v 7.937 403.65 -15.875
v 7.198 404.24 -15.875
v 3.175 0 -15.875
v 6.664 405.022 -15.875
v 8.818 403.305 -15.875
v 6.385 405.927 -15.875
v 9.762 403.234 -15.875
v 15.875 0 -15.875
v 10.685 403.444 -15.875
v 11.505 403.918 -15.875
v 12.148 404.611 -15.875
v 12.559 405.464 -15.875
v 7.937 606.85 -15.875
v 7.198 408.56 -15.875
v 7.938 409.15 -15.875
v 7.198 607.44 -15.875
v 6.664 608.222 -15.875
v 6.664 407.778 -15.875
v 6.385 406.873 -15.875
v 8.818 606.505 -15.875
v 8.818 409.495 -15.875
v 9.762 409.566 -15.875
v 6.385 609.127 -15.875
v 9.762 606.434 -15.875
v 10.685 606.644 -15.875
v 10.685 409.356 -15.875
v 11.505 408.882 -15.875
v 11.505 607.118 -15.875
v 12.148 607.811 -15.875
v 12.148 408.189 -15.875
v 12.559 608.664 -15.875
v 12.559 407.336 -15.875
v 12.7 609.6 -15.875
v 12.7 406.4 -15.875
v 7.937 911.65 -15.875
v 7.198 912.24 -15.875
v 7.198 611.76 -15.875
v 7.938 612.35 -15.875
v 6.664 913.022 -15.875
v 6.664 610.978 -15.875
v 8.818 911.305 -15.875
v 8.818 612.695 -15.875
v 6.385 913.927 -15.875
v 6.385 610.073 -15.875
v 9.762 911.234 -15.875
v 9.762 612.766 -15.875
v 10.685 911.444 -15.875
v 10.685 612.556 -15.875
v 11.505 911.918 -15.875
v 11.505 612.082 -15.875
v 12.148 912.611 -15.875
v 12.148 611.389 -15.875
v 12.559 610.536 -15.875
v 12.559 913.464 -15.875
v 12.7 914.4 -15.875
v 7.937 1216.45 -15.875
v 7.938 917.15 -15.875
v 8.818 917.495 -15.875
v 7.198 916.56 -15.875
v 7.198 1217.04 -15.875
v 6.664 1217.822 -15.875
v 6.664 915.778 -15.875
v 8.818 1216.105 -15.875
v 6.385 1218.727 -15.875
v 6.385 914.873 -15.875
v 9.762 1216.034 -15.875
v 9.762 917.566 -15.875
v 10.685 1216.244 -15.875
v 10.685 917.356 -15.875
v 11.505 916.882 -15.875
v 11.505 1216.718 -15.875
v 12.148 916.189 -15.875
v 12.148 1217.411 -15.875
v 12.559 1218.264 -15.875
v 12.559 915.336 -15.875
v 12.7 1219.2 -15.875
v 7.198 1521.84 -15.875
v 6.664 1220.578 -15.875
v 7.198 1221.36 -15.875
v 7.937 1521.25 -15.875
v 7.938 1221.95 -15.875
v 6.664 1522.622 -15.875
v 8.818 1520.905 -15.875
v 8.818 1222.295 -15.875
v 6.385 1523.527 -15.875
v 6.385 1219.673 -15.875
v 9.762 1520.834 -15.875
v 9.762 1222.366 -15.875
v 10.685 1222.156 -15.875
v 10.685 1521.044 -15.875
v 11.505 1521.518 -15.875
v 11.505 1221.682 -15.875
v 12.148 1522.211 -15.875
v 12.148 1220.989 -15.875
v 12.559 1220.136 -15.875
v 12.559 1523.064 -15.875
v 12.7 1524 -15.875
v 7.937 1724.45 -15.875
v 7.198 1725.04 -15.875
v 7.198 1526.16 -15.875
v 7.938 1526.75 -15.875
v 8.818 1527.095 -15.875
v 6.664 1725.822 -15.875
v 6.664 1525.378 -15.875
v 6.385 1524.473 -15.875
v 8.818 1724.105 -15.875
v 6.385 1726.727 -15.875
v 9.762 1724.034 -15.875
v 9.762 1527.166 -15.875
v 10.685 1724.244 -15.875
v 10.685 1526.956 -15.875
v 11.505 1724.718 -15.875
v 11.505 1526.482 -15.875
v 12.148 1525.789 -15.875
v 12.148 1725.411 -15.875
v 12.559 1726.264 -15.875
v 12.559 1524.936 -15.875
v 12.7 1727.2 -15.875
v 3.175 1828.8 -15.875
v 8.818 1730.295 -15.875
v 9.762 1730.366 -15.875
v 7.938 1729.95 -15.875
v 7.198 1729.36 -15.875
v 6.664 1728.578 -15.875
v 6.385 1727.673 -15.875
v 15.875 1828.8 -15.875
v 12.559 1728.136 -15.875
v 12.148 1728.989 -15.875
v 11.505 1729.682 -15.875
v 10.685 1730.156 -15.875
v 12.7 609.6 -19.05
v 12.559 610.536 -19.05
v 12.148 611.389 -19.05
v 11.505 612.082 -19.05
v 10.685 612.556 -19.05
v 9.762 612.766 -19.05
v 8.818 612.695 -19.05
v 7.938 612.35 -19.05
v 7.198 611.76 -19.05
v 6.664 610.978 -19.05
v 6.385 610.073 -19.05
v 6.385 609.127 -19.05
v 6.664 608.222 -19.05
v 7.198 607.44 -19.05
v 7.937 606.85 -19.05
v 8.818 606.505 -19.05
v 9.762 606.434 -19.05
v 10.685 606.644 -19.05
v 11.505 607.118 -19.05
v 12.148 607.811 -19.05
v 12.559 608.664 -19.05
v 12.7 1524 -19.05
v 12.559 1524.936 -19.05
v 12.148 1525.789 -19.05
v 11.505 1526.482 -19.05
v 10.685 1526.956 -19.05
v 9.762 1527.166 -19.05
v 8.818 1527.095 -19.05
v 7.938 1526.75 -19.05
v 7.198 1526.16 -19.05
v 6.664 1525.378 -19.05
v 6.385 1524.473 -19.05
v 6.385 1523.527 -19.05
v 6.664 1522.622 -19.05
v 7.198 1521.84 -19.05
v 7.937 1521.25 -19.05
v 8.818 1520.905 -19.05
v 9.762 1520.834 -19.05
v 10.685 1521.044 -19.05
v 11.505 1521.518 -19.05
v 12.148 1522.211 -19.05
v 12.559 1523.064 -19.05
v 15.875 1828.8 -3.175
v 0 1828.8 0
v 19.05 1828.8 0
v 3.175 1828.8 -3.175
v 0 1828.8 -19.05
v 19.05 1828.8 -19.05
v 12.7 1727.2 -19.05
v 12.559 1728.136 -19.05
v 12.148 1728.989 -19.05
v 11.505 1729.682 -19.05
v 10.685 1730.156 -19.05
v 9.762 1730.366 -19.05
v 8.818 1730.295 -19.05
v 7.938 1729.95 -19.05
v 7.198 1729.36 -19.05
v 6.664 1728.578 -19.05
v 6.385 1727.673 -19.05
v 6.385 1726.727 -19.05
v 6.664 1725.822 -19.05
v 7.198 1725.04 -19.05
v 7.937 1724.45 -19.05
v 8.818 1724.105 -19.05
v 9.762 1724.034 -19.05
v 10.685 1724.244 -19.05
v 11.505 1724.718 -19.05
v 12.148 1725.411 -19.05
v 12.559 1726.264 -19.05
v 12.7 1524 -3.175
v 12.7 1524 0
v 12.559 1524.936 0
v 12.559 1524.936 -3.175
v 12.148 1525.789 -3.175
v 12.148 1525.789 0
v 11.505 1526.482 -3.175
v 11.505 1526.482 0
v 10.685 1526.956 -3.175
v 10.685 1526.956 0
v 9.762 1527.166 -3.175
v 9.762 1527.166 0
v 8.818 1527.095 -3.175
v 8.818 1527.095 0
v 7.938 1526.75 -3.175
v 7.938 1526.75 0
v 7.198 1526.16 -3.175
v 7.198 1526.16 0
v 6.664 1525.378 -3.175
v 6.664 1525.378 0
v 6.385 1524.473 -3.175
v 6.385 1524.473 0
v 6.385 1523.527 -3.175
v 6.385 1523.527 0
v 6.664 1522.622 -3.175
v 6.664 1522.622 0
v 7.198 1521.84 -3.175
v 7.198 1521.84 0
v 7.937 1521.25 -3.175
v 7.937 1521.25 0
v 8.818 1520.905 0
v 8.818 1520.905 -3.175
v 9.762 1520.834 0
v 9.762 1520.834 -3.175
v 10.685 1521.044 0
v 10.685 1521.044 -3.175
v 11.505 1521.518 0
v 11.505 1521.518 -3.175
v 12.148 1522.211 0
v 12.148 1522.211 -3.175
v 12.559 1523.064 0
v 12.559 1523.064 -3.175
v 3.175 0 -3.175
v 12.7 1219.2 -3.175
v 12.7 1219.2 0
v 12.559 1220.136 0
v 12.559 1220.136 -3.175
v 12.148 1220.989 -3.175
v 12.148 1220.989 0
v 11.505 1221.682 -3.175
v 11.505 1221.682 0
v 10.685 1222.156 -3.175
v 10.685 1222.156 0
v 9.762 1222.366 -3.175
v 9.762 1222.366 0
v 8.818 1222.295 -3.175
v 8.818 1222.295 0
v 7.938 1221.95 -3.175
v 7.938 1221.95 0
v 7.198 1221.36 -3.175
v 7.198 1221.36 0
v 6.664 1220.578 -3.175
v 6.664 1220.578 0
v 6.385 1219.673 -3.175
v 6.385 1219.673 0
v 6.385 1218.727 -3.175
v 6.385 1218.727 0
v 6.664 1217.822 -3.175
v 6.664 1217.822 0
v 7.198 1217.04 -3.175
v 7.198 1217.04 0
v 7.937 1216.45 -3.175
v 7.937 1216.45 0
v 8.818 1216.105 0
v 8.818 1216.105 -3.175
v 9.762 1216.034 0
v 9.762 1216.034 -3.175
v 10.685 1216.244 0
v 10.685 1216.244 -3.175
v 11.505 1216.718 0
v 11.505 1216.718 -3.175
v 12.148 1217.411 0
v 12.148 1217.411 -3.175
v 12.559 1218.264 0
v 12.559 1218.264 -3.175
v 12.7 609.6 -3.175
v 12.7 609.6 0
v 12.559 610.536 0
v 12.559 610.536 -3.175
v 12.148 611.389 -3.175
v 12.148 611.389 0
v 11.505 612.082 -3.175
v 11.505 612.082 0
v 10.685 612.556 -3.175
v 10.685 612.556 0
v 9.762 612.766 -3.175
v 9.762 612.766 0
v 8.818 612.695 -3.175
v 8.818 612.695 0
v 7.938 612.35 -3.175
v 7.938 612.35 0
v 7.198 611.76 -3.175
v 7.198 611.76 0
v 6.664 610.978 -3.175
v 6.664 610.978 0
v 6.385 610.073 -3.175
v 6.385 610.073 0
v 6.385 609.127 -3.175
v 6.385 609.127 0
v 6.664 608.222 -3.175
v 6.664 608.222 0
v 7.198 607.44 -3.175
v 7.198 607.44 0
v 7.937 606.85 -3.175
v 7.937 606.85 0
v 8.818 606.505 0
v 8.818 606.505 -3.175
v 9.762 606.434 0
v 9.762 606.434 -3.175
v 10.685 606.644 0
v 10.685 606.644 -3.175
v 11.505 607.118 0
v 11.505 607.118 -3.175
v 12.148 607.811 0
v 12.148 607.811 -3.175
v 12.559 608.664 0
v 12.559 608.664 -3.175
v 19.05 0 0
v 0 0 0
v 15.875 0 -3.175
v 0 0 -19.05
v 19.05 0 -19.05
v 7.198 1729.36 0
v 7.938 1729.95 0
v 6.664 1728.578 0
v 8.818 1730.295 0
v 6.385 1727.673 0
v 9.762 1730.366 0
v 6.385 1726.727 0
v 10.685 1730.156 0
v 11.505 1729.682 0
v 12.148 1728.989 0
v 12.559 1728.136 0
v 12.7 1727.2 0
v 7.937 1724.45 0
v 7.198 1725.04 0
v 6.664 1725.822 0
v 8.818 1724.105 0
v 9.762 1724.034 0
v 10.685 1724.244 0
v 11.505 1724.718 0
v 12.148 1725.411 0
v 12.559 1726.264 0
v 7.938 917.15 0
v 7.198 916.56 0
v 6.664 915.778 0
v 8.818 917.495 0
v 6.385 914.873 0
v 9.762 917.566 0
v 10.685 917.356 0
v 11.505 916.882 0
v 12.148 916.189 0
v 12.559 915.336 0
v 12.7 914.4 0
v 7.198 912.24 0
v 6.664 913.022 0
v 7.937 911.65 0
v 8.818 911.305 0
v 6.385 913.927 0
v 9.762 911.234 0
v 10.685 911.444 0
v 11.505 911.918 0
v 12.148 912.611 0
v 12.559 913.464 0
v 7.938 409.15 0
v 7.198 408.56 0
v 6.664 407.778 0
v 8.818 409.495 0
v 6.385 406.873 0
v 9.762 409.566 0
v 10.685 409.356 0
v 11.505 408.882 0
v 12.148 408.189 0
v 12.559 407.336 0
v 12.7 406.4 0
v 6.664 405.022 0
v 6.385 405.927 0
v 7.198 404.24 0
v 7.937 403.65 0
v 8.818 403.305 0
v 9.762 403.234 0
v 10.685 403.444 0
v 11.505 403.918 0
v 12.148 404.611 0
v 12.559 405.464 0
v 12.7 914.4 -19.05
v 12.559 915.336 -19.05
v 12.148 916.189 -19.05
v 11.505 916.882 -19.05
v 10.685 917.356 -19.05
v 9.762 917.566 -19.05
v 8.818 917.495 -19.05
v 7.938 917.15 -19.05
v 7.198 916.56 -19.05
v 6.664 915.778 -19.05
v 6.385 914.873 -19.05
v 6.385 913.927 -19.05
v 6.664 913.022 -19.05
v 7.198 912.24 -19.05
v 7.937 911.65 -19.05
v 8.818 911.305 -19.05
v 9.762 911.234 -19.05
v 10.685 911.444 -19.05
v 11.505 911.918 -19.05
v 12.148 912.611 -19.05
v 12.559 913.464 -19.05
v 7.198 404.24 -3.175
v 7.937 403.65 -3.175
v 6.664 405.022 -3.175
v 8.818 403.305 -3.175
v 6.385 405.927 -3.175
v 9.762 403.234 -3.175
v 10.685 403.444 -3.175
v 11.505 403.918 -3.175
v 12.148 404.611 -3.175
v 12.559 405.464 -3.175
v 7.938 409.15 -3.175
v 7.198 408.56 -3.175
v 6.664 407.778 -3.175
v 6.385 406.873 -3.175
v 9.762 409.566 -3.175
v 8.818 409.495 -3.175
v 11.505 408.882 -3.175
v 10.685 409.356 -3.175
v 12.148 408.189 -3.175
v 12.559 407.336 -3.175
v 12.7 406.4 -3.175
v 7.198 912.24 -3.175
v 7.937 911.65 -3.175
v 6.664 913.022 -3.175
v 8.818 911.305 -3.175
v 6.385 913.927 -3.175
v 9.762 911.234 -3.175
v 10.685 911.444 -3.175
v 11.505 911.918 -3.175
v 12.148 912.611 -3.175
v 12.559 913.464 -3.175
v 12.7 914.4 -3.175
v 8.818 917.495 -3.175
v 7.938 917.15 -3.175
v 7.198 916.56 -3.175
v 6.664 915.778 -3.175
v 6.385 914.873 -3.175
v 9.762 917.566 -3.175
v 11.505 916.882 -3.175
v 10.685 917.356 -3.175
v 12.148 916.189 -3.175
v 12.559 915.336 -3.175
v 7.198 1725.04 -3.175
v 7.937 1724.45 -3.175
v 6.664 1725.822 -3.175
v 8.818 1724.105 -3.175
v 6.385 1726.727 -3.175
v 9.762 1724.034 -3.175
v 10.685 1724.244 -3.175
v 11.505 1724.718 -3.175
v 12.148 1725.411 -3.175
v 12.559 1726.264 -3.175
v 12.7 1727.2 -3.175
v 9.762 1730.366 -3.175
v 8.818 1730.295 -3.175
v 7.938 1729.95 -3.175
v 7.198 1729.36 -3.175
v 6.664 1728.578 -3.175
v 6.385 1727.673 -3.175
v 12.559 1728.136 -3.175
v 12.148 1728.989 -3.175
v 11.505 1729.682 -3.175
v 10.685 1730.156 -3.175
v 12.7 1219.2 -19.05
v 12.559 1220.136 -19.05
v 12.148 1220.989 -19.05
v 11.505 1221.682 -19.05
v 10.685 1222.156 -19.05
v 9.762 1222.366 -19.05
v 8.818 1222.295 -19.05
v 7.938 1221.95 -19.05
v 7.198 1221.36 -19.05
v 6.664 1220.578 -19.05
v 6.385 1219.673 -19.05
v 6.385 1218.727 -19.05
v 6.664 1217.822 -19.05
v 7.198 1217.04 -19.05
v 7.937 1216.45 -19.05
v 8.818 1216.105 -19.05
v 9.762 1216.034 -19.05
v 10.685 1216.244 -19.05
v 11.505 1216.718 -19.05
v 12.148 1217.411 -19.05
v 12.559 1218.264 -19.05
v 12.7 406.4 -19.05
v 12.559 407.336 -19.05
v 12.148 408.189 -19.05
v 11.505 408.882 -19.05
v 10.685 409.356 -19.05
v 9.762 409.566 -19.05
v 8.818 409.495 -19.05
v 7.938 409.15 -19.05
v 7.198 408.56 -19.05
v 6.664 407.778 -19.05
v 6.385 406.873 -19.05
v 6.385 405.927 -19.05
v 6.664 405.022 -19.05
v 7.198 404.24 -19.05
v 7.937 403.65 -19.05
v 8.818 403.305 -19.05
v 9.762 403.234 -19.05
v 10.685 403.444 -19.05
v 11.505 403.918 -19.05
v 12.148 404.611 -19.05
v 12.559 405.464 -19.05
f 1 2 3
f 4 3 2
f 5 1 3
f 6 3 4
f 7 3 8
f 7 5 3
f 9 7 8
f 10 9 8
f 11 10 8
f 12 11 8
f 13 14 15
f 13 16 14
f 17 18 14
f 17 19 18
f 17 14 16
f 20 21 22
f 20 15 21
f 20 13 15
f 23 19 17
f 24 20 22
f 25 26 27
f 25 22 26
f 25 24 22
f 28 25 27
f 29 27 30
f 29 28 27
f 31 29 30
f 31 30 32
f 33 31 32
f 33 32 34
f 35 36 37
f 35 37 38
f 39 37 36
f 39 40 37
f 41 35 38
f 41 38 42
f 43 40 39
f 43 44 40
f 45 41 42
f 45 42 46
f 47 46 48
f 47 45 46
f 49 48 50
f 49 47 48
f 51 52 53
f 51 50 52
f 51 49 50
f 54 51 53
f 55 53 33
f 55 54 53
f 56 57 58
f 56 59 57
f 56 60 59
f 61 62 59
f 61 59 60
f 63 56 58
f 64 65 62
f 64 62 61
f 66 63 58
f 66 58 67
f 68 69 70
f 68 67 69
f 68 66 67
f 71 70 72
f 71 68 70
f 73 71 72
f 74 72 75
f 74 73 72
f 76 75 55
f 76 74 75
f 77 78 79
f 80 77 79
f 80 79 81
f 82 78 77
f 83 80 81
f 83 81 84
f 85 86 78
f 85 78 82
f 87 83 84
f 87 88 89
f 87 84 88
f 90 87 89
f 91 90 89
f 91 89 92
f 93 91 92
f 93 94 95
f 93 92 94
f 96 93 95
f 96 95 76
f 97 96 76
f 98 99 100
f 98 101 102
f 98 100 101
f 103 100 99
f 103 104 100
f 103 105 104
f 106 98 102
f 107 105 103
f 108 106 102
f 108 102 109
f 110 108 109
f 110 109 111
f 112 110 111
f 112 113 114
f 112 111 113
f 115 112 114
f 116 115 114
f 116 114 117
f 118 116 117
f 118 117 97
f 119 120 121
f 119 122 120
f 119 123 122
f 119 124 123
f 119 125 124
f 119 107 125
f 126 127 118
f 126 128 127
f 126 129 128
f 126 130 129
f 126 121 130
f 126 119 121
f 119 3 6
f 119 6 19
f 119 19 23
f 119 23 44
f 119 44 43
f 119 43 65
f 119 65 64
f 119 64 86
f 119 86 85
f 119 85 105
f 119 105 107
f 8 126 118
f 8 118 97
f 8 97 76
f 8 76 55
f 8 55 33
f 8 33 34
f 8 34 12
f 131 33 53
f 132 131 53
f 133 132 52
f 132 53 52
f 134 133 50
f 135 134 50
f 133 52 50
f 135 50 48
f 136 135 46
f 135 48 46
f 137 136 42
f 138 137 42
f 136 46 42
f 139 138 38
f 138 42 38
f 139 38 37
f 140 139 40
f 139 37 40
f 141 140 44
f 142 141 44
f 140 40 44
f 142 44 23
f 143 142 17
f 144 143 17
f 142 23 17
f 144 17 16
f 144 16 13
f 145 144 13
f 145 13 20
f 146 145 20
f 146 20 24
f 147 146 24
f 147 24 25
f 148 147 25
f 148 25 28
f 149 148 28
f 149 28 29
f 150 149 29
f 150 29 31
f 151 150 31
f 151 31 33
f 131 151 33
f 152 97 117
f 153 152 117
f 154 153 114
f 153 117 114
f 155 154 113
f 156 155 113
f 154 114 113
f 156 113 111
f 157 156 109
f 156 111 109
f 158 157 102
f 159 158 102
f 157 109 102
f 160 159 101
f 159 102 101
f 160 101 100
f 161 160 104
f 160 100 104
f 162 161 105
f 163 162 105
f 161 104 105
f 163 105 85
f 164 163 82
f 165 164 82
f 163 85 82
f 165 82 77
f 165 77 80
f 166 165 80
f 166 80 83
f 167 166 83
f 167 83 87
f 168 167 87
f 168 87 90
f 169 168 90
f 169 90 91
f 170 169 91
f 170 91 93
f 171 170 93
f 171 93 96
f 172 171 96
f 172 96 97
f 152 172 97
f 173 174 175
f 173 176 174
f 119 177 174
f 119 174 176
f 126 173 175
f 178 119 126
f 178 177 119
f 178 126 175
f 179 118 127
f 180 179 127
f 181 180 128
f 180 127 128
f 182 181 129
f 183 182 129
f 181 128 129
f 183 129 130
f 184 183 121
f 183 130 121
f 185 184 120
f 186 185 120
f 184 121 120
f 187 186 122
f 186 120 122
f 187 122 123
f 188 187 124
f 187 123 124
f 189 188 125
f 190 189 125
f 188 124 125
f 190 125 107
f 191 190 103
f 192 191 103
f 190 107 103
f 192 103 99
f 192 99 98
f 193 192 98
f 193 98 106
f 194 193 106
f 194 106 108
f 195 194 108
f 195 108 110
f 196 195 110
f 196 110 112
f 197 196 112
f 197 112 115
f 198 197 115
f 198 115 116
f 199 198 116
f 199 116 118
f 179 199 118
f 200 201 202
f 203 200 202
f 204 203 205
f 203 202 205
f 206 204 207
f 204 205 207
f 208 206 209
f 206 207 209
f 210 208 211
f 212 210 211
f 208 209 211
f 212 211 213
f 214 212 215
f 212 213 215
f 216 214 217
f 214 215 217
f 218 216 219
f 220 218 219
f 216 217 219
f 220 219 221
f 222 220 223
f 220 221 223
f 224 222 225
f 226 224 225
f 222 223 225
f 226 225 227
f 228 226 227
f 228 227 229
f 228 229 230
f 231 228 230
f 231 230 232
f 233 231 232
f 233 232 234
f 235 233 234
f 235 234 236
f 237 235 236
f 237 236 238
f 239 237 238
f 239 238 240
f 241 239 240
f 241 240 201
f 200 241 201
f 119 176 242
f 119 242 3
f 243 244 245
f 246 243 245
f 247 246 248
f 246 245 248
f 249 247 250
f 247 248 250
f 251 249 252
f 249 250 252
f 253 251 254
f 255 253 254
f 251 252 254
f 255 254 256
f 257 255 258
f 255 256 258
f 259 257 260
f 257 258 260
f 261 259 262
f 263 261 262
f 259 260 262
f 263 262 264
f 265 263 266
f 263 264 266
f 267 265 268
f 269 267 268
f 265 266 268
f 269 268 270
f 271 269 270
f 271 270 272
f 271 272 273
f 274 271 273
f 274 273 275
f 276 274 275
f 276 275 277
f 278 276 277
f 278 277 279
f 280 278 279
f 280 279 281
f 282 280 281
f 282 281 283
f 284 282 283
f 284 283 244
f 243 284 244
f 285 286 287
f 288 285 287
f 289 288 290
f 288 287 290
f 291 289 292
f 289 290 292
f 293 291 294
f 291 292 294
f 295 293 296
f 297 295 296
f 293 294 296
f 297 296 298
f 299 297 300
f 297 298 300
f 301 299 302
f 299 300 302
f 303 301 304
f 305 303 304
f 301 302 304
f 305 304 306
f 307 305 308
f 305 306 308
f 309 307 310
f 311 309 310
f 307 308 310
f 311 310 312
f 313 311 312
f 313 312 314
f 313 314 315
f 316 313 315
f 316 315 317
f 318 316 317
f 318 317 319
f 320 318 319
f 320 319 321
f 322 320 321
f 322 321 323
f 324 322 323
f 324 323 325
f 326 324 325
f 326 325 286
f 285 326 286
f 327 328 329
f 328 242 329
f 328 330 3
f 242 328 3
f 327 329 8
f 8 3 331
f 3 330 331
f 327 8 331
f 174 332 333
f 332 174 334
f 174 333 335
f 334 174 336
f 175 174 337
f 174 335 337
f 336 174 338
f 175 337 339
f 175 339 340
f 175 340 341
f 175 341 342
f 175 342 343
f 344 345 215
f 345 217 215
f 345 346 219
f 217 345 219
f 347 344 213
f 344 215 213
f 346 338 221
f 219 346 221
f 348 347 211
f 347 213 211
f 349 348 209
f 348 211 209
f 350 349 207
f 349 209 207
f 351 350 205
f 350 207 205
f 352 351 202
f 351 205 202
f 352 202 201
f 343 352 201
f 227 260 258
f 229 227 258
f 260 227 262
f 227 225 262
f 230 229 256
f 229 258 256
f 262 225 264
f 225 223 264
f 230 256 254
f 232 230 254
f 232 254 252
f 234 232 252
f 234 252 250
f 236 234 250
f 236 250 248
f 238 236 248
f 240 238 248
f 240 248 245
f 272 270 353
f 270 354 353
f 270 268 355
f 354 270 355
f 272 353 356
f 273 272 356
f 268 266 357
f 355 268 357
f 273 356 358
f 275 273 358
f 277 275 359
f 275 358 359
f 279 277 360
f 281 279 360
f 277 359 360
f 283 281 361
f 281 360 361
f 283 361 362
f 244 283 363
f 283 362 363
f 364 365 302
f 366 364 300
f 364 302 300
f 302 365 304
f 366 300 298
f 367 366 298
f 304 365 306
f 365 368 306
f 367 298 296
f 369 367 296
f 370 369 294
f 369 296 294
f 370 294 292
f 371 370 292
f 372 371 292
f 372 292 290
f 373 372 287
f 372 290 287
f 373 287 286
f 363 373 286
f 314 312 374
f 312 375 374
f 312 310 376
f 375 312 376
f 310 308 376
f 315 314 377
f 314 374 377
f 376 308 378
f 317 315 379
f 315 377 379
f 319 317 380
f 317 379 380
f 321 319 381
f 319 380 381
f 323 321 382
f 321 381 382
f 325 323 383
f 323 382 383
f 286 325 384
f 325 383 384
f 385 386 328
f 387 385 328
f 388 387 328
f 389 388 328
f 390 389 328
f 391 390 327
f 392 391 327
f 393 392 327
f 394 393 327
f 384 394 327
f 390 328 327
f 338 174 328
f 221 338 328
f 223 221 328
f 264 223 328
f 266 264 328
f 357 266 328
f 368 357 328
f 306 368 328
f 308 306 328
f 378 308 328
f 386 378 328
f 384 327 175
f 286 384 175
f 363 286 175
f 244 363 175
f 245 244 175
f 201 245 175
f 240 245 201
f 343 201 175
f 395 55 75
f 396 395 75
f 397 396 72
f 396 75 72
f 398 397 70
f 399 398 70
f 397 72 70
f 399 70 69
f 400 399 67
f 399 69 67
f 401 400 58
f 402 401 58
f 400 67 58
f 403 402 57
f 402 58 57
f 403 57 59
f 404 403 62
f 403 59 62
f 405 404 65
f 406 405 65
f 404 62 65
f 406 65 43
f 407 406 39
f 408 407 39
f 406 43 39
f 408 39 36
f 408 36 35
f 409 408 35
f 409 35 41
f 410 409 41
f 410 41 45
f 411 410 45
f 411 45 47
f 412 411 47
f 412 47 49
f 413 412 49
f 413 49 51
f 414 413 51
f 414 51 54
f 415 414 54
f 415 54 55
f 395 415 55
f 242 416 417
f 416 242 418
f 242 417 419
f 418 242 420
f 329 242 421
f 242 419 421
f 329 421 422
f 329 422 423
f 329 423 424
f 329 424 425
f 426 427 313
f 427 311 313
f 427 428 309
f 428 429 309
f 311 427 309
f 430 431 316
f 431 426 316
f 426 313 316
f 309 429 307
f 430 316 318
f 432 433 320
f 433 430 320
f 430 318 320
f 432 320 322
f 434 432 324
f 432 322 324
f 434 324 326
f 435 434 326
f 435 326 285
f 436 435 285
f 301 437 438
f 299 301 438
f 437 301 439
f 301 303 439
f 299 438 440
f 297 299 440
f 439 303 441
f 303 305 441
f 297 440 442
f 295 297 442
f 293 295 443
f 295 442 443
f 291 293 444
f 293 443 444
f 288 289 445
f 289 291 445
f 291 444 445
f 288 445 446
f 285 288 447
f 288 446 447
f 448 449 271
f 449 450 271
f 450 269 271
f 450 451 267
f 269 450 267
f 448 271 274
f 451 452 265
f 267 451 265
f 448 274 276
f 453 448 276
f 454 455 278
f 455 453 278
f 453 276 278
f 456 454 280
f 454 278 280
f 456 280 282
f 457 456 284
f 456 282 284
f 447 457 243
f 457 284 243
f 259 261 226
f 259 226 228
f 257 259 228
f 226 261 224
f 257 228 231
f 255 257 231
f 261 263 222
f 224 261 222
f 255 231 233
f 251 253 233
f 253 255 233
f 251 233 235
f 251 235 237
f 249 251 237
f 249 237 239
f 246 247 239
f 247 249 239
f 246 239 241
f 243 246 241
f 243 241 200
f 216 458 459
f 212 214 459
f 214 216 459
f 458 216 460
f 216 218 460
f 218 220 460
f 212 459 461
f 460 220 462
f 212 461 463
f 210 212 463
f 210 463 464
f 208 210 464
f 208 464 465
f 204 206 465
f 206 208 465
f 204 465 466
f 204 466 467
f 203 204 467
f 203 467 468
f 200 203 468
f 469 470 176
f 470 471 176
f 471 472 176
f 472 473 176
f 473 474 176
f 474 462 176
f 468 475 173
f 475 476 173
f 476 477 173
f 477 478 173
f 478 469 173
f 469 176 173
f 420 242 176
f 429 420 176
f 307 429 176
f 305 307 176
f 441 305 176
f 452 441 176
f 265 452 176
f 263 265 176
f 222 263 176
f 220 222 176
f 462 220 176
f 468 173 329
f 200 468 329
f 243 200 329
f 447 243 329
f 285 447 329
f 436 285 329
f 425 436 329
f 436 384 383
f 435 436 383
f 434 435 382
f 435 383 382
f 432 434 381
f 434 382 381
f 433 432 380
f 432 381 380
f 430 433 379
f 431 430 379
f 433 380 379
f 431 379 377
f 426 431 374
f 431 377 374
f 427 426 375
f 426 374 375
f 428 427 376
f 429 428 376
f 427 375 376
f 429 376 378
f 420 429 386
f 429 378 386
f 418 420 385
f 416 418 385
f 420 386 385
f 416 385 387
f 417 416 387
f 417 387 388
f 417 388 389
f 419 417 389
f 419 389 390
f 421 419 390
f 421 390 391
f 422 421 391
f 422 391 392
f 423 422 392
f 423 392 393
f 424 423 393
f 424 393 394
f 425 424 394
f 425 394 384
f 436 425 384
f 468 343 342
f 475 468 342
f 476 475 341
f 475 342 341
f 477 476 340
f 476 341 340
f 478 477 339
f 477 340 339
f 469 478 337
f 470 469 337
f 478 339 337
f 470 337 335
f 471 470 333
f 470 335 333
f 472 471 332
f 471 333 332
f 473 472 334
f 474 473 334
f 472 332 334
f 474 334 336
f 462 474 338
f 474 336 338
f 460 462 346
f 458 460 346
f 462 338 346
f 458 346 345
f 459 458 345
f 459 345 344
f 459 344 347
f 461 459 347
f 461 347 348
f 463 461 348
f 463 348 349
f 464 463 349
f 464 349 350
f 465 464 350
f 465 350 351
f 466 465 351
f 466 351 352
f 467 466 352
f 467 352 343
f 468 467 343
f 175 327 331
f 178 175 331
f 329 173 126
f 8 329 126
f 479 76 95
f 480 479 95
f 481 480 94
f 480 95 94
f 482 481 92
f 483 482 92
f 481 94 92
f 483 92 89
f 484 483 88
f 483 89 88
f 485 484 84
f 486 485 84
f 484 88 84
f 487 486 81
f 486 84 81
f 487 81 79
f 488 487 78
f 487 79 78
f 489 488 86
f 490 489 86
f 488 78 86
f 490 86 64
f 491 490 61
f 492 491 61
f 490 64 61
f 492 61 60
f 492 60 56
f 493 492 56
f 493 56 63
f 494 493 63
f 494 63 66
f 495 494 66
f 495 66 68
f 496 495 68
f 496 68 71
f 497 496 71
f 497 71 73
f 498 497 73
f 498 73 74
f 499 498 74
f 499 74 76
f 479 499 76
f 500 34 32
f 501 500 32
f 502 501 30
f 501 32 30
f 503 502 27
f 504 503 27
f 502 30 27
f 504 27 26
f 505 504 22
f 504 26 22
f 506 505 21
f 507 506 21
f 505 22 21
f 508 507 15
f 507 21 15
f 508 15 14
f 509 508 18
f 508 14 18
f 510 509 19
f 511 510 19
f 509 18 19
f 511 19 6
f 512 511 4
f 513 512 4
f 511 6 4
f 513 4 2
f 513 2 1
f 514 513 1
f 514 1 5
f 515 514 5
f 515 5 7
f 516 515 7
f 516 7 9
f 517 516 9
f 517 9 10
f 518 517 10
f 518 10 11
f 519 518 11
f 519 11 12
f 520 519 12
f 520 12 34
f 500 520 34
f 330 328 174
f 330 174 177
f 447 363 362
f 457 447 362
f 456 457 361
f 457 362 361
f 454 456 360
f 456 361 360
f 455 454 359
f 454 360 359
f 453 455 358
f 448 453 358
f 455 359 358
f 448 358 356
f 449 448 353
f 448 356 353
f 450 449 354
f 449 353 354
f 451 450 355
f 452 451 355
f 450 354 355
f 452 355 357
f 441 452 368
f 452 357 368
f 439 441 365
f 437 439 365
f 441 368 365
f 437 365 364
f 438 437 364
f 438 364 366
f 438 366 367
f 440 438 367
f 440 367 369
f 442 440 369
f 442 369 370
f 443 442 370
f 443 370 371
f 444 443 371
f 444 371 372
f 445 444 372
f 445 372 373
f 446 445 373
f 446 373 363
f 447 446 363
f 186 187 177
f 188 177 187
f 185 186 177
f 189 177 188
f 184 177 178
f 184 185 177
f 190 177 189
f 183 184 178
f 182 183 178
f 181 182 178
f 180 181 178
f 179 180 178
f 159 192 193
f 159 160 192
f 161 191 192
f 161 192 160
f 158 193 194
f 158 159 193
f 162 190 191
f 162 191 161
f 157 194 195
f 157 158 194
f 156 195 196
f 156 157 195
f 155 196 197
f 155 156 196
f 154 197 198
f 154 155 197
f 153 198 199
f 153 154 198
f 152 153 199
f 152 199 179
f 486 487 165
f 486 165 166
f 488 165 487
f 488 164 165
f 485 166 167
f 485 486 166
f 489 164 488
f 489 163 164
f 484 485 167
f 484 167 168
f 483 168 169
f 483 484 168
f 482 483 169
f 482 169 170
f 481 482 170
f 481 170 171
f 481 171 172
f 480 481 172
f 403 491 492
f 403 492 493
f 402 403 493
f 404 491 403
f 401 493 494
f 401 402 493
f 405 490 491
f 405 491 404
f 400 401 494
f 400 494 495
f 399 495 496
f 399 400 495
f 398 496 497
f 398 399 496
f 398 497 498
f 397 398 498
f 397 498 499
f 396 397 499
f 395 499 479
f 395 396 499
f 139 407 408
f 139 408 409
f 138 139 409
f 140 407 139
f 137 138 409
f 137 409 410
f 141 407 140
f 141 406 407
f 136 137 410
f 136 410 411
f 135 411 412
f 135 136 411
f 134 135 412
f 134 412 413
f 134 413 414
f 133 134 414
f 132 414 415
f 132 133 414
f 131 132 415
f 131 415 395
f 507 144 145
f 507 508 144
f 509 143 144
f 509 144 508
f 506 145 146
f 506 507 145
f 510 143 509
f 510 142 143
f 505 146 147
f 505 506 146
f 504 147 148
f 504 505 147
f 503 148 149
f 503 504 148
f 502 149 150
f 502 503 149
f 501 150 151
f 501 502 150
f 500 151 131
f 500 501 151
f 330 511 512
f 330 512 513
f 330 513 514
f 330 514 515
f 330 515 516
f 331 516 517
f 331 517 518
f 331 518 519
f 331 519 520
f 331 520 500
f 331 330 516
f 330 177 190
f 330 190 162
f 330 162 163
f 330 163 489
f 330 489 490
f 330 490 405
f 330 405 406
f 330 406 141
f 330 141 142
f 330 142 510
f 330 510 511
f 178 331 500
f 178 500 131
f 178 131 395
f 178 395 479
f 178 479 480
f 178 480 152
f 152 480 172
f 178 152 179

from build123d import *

# Parameters (mm, degrees)
SKETCH1_W           = 19.05
SKETCH1_H           = 19.05
BOSS_EXTRUDE1_DEPTH = 1828.8
SKETCH2_W           = 12.7
SKETCH2_H           = 12.7
CUT_EXTRUDE1_DEPTH  = 1829.8
SKETCH3_R           = 3.175
CUT_EXTRUDE2_DEPTH  = 20.05


with BuildPart() as part:
    # Sketch1 → Boss-Extrude1 (new body)
    with BuildSketch(Plane(origin=(0, 0, 0), x_dir=(1, 0, 0), z_dir=(0, 1, 0))):
        with Locations((9.525, 9.525)):
            Rectangle(SKETCH1_W, SKETCH1_H)
    extrude(amount=BOSS_EXTRUDE1_DEPTH)

    # Sketch2 → Cut-Extrude1 (cut, through all)
    with BuildSketch(Plane(origin=(0, 1828.8, 0), x_dir=(1, 0, 0), z_dir=(0, 1, 0))):
        with Locations((9.525, 9.525)):
            Rectangle(SKETCH2_W, SKETCH2_H)
    extrude(amount=-CUT_EXTRUDE1_DEPTH, mode=Mode.SUBTRACT)

    # Sketch3 → Cut-Extrude2 (cut, through all)
    with BuildSketch(Plane.XY):
        with Locations((9.525, 1727.2)):
            Circle(SKETCH3_R)
        with Locations((9.525, 1524)):
            Circle(SKETCH3_R)
        with Locations((9.525, 1219.2)):
            Circle(SKETCH3_R)
        with Locations((9.525, 914.4)):
            Circle(SKETCH3_R)
        with Locations((9.525, 406.4)):
            Circle(SKETCH3_R)
        with Locations((9.525, 609.6)):
            Circle(SKETCH3_R)
    extrude(amount=-CUT_EXTRUDE2_DEPTH, mode=Mode.SUBTRACT)


solid = part.part
